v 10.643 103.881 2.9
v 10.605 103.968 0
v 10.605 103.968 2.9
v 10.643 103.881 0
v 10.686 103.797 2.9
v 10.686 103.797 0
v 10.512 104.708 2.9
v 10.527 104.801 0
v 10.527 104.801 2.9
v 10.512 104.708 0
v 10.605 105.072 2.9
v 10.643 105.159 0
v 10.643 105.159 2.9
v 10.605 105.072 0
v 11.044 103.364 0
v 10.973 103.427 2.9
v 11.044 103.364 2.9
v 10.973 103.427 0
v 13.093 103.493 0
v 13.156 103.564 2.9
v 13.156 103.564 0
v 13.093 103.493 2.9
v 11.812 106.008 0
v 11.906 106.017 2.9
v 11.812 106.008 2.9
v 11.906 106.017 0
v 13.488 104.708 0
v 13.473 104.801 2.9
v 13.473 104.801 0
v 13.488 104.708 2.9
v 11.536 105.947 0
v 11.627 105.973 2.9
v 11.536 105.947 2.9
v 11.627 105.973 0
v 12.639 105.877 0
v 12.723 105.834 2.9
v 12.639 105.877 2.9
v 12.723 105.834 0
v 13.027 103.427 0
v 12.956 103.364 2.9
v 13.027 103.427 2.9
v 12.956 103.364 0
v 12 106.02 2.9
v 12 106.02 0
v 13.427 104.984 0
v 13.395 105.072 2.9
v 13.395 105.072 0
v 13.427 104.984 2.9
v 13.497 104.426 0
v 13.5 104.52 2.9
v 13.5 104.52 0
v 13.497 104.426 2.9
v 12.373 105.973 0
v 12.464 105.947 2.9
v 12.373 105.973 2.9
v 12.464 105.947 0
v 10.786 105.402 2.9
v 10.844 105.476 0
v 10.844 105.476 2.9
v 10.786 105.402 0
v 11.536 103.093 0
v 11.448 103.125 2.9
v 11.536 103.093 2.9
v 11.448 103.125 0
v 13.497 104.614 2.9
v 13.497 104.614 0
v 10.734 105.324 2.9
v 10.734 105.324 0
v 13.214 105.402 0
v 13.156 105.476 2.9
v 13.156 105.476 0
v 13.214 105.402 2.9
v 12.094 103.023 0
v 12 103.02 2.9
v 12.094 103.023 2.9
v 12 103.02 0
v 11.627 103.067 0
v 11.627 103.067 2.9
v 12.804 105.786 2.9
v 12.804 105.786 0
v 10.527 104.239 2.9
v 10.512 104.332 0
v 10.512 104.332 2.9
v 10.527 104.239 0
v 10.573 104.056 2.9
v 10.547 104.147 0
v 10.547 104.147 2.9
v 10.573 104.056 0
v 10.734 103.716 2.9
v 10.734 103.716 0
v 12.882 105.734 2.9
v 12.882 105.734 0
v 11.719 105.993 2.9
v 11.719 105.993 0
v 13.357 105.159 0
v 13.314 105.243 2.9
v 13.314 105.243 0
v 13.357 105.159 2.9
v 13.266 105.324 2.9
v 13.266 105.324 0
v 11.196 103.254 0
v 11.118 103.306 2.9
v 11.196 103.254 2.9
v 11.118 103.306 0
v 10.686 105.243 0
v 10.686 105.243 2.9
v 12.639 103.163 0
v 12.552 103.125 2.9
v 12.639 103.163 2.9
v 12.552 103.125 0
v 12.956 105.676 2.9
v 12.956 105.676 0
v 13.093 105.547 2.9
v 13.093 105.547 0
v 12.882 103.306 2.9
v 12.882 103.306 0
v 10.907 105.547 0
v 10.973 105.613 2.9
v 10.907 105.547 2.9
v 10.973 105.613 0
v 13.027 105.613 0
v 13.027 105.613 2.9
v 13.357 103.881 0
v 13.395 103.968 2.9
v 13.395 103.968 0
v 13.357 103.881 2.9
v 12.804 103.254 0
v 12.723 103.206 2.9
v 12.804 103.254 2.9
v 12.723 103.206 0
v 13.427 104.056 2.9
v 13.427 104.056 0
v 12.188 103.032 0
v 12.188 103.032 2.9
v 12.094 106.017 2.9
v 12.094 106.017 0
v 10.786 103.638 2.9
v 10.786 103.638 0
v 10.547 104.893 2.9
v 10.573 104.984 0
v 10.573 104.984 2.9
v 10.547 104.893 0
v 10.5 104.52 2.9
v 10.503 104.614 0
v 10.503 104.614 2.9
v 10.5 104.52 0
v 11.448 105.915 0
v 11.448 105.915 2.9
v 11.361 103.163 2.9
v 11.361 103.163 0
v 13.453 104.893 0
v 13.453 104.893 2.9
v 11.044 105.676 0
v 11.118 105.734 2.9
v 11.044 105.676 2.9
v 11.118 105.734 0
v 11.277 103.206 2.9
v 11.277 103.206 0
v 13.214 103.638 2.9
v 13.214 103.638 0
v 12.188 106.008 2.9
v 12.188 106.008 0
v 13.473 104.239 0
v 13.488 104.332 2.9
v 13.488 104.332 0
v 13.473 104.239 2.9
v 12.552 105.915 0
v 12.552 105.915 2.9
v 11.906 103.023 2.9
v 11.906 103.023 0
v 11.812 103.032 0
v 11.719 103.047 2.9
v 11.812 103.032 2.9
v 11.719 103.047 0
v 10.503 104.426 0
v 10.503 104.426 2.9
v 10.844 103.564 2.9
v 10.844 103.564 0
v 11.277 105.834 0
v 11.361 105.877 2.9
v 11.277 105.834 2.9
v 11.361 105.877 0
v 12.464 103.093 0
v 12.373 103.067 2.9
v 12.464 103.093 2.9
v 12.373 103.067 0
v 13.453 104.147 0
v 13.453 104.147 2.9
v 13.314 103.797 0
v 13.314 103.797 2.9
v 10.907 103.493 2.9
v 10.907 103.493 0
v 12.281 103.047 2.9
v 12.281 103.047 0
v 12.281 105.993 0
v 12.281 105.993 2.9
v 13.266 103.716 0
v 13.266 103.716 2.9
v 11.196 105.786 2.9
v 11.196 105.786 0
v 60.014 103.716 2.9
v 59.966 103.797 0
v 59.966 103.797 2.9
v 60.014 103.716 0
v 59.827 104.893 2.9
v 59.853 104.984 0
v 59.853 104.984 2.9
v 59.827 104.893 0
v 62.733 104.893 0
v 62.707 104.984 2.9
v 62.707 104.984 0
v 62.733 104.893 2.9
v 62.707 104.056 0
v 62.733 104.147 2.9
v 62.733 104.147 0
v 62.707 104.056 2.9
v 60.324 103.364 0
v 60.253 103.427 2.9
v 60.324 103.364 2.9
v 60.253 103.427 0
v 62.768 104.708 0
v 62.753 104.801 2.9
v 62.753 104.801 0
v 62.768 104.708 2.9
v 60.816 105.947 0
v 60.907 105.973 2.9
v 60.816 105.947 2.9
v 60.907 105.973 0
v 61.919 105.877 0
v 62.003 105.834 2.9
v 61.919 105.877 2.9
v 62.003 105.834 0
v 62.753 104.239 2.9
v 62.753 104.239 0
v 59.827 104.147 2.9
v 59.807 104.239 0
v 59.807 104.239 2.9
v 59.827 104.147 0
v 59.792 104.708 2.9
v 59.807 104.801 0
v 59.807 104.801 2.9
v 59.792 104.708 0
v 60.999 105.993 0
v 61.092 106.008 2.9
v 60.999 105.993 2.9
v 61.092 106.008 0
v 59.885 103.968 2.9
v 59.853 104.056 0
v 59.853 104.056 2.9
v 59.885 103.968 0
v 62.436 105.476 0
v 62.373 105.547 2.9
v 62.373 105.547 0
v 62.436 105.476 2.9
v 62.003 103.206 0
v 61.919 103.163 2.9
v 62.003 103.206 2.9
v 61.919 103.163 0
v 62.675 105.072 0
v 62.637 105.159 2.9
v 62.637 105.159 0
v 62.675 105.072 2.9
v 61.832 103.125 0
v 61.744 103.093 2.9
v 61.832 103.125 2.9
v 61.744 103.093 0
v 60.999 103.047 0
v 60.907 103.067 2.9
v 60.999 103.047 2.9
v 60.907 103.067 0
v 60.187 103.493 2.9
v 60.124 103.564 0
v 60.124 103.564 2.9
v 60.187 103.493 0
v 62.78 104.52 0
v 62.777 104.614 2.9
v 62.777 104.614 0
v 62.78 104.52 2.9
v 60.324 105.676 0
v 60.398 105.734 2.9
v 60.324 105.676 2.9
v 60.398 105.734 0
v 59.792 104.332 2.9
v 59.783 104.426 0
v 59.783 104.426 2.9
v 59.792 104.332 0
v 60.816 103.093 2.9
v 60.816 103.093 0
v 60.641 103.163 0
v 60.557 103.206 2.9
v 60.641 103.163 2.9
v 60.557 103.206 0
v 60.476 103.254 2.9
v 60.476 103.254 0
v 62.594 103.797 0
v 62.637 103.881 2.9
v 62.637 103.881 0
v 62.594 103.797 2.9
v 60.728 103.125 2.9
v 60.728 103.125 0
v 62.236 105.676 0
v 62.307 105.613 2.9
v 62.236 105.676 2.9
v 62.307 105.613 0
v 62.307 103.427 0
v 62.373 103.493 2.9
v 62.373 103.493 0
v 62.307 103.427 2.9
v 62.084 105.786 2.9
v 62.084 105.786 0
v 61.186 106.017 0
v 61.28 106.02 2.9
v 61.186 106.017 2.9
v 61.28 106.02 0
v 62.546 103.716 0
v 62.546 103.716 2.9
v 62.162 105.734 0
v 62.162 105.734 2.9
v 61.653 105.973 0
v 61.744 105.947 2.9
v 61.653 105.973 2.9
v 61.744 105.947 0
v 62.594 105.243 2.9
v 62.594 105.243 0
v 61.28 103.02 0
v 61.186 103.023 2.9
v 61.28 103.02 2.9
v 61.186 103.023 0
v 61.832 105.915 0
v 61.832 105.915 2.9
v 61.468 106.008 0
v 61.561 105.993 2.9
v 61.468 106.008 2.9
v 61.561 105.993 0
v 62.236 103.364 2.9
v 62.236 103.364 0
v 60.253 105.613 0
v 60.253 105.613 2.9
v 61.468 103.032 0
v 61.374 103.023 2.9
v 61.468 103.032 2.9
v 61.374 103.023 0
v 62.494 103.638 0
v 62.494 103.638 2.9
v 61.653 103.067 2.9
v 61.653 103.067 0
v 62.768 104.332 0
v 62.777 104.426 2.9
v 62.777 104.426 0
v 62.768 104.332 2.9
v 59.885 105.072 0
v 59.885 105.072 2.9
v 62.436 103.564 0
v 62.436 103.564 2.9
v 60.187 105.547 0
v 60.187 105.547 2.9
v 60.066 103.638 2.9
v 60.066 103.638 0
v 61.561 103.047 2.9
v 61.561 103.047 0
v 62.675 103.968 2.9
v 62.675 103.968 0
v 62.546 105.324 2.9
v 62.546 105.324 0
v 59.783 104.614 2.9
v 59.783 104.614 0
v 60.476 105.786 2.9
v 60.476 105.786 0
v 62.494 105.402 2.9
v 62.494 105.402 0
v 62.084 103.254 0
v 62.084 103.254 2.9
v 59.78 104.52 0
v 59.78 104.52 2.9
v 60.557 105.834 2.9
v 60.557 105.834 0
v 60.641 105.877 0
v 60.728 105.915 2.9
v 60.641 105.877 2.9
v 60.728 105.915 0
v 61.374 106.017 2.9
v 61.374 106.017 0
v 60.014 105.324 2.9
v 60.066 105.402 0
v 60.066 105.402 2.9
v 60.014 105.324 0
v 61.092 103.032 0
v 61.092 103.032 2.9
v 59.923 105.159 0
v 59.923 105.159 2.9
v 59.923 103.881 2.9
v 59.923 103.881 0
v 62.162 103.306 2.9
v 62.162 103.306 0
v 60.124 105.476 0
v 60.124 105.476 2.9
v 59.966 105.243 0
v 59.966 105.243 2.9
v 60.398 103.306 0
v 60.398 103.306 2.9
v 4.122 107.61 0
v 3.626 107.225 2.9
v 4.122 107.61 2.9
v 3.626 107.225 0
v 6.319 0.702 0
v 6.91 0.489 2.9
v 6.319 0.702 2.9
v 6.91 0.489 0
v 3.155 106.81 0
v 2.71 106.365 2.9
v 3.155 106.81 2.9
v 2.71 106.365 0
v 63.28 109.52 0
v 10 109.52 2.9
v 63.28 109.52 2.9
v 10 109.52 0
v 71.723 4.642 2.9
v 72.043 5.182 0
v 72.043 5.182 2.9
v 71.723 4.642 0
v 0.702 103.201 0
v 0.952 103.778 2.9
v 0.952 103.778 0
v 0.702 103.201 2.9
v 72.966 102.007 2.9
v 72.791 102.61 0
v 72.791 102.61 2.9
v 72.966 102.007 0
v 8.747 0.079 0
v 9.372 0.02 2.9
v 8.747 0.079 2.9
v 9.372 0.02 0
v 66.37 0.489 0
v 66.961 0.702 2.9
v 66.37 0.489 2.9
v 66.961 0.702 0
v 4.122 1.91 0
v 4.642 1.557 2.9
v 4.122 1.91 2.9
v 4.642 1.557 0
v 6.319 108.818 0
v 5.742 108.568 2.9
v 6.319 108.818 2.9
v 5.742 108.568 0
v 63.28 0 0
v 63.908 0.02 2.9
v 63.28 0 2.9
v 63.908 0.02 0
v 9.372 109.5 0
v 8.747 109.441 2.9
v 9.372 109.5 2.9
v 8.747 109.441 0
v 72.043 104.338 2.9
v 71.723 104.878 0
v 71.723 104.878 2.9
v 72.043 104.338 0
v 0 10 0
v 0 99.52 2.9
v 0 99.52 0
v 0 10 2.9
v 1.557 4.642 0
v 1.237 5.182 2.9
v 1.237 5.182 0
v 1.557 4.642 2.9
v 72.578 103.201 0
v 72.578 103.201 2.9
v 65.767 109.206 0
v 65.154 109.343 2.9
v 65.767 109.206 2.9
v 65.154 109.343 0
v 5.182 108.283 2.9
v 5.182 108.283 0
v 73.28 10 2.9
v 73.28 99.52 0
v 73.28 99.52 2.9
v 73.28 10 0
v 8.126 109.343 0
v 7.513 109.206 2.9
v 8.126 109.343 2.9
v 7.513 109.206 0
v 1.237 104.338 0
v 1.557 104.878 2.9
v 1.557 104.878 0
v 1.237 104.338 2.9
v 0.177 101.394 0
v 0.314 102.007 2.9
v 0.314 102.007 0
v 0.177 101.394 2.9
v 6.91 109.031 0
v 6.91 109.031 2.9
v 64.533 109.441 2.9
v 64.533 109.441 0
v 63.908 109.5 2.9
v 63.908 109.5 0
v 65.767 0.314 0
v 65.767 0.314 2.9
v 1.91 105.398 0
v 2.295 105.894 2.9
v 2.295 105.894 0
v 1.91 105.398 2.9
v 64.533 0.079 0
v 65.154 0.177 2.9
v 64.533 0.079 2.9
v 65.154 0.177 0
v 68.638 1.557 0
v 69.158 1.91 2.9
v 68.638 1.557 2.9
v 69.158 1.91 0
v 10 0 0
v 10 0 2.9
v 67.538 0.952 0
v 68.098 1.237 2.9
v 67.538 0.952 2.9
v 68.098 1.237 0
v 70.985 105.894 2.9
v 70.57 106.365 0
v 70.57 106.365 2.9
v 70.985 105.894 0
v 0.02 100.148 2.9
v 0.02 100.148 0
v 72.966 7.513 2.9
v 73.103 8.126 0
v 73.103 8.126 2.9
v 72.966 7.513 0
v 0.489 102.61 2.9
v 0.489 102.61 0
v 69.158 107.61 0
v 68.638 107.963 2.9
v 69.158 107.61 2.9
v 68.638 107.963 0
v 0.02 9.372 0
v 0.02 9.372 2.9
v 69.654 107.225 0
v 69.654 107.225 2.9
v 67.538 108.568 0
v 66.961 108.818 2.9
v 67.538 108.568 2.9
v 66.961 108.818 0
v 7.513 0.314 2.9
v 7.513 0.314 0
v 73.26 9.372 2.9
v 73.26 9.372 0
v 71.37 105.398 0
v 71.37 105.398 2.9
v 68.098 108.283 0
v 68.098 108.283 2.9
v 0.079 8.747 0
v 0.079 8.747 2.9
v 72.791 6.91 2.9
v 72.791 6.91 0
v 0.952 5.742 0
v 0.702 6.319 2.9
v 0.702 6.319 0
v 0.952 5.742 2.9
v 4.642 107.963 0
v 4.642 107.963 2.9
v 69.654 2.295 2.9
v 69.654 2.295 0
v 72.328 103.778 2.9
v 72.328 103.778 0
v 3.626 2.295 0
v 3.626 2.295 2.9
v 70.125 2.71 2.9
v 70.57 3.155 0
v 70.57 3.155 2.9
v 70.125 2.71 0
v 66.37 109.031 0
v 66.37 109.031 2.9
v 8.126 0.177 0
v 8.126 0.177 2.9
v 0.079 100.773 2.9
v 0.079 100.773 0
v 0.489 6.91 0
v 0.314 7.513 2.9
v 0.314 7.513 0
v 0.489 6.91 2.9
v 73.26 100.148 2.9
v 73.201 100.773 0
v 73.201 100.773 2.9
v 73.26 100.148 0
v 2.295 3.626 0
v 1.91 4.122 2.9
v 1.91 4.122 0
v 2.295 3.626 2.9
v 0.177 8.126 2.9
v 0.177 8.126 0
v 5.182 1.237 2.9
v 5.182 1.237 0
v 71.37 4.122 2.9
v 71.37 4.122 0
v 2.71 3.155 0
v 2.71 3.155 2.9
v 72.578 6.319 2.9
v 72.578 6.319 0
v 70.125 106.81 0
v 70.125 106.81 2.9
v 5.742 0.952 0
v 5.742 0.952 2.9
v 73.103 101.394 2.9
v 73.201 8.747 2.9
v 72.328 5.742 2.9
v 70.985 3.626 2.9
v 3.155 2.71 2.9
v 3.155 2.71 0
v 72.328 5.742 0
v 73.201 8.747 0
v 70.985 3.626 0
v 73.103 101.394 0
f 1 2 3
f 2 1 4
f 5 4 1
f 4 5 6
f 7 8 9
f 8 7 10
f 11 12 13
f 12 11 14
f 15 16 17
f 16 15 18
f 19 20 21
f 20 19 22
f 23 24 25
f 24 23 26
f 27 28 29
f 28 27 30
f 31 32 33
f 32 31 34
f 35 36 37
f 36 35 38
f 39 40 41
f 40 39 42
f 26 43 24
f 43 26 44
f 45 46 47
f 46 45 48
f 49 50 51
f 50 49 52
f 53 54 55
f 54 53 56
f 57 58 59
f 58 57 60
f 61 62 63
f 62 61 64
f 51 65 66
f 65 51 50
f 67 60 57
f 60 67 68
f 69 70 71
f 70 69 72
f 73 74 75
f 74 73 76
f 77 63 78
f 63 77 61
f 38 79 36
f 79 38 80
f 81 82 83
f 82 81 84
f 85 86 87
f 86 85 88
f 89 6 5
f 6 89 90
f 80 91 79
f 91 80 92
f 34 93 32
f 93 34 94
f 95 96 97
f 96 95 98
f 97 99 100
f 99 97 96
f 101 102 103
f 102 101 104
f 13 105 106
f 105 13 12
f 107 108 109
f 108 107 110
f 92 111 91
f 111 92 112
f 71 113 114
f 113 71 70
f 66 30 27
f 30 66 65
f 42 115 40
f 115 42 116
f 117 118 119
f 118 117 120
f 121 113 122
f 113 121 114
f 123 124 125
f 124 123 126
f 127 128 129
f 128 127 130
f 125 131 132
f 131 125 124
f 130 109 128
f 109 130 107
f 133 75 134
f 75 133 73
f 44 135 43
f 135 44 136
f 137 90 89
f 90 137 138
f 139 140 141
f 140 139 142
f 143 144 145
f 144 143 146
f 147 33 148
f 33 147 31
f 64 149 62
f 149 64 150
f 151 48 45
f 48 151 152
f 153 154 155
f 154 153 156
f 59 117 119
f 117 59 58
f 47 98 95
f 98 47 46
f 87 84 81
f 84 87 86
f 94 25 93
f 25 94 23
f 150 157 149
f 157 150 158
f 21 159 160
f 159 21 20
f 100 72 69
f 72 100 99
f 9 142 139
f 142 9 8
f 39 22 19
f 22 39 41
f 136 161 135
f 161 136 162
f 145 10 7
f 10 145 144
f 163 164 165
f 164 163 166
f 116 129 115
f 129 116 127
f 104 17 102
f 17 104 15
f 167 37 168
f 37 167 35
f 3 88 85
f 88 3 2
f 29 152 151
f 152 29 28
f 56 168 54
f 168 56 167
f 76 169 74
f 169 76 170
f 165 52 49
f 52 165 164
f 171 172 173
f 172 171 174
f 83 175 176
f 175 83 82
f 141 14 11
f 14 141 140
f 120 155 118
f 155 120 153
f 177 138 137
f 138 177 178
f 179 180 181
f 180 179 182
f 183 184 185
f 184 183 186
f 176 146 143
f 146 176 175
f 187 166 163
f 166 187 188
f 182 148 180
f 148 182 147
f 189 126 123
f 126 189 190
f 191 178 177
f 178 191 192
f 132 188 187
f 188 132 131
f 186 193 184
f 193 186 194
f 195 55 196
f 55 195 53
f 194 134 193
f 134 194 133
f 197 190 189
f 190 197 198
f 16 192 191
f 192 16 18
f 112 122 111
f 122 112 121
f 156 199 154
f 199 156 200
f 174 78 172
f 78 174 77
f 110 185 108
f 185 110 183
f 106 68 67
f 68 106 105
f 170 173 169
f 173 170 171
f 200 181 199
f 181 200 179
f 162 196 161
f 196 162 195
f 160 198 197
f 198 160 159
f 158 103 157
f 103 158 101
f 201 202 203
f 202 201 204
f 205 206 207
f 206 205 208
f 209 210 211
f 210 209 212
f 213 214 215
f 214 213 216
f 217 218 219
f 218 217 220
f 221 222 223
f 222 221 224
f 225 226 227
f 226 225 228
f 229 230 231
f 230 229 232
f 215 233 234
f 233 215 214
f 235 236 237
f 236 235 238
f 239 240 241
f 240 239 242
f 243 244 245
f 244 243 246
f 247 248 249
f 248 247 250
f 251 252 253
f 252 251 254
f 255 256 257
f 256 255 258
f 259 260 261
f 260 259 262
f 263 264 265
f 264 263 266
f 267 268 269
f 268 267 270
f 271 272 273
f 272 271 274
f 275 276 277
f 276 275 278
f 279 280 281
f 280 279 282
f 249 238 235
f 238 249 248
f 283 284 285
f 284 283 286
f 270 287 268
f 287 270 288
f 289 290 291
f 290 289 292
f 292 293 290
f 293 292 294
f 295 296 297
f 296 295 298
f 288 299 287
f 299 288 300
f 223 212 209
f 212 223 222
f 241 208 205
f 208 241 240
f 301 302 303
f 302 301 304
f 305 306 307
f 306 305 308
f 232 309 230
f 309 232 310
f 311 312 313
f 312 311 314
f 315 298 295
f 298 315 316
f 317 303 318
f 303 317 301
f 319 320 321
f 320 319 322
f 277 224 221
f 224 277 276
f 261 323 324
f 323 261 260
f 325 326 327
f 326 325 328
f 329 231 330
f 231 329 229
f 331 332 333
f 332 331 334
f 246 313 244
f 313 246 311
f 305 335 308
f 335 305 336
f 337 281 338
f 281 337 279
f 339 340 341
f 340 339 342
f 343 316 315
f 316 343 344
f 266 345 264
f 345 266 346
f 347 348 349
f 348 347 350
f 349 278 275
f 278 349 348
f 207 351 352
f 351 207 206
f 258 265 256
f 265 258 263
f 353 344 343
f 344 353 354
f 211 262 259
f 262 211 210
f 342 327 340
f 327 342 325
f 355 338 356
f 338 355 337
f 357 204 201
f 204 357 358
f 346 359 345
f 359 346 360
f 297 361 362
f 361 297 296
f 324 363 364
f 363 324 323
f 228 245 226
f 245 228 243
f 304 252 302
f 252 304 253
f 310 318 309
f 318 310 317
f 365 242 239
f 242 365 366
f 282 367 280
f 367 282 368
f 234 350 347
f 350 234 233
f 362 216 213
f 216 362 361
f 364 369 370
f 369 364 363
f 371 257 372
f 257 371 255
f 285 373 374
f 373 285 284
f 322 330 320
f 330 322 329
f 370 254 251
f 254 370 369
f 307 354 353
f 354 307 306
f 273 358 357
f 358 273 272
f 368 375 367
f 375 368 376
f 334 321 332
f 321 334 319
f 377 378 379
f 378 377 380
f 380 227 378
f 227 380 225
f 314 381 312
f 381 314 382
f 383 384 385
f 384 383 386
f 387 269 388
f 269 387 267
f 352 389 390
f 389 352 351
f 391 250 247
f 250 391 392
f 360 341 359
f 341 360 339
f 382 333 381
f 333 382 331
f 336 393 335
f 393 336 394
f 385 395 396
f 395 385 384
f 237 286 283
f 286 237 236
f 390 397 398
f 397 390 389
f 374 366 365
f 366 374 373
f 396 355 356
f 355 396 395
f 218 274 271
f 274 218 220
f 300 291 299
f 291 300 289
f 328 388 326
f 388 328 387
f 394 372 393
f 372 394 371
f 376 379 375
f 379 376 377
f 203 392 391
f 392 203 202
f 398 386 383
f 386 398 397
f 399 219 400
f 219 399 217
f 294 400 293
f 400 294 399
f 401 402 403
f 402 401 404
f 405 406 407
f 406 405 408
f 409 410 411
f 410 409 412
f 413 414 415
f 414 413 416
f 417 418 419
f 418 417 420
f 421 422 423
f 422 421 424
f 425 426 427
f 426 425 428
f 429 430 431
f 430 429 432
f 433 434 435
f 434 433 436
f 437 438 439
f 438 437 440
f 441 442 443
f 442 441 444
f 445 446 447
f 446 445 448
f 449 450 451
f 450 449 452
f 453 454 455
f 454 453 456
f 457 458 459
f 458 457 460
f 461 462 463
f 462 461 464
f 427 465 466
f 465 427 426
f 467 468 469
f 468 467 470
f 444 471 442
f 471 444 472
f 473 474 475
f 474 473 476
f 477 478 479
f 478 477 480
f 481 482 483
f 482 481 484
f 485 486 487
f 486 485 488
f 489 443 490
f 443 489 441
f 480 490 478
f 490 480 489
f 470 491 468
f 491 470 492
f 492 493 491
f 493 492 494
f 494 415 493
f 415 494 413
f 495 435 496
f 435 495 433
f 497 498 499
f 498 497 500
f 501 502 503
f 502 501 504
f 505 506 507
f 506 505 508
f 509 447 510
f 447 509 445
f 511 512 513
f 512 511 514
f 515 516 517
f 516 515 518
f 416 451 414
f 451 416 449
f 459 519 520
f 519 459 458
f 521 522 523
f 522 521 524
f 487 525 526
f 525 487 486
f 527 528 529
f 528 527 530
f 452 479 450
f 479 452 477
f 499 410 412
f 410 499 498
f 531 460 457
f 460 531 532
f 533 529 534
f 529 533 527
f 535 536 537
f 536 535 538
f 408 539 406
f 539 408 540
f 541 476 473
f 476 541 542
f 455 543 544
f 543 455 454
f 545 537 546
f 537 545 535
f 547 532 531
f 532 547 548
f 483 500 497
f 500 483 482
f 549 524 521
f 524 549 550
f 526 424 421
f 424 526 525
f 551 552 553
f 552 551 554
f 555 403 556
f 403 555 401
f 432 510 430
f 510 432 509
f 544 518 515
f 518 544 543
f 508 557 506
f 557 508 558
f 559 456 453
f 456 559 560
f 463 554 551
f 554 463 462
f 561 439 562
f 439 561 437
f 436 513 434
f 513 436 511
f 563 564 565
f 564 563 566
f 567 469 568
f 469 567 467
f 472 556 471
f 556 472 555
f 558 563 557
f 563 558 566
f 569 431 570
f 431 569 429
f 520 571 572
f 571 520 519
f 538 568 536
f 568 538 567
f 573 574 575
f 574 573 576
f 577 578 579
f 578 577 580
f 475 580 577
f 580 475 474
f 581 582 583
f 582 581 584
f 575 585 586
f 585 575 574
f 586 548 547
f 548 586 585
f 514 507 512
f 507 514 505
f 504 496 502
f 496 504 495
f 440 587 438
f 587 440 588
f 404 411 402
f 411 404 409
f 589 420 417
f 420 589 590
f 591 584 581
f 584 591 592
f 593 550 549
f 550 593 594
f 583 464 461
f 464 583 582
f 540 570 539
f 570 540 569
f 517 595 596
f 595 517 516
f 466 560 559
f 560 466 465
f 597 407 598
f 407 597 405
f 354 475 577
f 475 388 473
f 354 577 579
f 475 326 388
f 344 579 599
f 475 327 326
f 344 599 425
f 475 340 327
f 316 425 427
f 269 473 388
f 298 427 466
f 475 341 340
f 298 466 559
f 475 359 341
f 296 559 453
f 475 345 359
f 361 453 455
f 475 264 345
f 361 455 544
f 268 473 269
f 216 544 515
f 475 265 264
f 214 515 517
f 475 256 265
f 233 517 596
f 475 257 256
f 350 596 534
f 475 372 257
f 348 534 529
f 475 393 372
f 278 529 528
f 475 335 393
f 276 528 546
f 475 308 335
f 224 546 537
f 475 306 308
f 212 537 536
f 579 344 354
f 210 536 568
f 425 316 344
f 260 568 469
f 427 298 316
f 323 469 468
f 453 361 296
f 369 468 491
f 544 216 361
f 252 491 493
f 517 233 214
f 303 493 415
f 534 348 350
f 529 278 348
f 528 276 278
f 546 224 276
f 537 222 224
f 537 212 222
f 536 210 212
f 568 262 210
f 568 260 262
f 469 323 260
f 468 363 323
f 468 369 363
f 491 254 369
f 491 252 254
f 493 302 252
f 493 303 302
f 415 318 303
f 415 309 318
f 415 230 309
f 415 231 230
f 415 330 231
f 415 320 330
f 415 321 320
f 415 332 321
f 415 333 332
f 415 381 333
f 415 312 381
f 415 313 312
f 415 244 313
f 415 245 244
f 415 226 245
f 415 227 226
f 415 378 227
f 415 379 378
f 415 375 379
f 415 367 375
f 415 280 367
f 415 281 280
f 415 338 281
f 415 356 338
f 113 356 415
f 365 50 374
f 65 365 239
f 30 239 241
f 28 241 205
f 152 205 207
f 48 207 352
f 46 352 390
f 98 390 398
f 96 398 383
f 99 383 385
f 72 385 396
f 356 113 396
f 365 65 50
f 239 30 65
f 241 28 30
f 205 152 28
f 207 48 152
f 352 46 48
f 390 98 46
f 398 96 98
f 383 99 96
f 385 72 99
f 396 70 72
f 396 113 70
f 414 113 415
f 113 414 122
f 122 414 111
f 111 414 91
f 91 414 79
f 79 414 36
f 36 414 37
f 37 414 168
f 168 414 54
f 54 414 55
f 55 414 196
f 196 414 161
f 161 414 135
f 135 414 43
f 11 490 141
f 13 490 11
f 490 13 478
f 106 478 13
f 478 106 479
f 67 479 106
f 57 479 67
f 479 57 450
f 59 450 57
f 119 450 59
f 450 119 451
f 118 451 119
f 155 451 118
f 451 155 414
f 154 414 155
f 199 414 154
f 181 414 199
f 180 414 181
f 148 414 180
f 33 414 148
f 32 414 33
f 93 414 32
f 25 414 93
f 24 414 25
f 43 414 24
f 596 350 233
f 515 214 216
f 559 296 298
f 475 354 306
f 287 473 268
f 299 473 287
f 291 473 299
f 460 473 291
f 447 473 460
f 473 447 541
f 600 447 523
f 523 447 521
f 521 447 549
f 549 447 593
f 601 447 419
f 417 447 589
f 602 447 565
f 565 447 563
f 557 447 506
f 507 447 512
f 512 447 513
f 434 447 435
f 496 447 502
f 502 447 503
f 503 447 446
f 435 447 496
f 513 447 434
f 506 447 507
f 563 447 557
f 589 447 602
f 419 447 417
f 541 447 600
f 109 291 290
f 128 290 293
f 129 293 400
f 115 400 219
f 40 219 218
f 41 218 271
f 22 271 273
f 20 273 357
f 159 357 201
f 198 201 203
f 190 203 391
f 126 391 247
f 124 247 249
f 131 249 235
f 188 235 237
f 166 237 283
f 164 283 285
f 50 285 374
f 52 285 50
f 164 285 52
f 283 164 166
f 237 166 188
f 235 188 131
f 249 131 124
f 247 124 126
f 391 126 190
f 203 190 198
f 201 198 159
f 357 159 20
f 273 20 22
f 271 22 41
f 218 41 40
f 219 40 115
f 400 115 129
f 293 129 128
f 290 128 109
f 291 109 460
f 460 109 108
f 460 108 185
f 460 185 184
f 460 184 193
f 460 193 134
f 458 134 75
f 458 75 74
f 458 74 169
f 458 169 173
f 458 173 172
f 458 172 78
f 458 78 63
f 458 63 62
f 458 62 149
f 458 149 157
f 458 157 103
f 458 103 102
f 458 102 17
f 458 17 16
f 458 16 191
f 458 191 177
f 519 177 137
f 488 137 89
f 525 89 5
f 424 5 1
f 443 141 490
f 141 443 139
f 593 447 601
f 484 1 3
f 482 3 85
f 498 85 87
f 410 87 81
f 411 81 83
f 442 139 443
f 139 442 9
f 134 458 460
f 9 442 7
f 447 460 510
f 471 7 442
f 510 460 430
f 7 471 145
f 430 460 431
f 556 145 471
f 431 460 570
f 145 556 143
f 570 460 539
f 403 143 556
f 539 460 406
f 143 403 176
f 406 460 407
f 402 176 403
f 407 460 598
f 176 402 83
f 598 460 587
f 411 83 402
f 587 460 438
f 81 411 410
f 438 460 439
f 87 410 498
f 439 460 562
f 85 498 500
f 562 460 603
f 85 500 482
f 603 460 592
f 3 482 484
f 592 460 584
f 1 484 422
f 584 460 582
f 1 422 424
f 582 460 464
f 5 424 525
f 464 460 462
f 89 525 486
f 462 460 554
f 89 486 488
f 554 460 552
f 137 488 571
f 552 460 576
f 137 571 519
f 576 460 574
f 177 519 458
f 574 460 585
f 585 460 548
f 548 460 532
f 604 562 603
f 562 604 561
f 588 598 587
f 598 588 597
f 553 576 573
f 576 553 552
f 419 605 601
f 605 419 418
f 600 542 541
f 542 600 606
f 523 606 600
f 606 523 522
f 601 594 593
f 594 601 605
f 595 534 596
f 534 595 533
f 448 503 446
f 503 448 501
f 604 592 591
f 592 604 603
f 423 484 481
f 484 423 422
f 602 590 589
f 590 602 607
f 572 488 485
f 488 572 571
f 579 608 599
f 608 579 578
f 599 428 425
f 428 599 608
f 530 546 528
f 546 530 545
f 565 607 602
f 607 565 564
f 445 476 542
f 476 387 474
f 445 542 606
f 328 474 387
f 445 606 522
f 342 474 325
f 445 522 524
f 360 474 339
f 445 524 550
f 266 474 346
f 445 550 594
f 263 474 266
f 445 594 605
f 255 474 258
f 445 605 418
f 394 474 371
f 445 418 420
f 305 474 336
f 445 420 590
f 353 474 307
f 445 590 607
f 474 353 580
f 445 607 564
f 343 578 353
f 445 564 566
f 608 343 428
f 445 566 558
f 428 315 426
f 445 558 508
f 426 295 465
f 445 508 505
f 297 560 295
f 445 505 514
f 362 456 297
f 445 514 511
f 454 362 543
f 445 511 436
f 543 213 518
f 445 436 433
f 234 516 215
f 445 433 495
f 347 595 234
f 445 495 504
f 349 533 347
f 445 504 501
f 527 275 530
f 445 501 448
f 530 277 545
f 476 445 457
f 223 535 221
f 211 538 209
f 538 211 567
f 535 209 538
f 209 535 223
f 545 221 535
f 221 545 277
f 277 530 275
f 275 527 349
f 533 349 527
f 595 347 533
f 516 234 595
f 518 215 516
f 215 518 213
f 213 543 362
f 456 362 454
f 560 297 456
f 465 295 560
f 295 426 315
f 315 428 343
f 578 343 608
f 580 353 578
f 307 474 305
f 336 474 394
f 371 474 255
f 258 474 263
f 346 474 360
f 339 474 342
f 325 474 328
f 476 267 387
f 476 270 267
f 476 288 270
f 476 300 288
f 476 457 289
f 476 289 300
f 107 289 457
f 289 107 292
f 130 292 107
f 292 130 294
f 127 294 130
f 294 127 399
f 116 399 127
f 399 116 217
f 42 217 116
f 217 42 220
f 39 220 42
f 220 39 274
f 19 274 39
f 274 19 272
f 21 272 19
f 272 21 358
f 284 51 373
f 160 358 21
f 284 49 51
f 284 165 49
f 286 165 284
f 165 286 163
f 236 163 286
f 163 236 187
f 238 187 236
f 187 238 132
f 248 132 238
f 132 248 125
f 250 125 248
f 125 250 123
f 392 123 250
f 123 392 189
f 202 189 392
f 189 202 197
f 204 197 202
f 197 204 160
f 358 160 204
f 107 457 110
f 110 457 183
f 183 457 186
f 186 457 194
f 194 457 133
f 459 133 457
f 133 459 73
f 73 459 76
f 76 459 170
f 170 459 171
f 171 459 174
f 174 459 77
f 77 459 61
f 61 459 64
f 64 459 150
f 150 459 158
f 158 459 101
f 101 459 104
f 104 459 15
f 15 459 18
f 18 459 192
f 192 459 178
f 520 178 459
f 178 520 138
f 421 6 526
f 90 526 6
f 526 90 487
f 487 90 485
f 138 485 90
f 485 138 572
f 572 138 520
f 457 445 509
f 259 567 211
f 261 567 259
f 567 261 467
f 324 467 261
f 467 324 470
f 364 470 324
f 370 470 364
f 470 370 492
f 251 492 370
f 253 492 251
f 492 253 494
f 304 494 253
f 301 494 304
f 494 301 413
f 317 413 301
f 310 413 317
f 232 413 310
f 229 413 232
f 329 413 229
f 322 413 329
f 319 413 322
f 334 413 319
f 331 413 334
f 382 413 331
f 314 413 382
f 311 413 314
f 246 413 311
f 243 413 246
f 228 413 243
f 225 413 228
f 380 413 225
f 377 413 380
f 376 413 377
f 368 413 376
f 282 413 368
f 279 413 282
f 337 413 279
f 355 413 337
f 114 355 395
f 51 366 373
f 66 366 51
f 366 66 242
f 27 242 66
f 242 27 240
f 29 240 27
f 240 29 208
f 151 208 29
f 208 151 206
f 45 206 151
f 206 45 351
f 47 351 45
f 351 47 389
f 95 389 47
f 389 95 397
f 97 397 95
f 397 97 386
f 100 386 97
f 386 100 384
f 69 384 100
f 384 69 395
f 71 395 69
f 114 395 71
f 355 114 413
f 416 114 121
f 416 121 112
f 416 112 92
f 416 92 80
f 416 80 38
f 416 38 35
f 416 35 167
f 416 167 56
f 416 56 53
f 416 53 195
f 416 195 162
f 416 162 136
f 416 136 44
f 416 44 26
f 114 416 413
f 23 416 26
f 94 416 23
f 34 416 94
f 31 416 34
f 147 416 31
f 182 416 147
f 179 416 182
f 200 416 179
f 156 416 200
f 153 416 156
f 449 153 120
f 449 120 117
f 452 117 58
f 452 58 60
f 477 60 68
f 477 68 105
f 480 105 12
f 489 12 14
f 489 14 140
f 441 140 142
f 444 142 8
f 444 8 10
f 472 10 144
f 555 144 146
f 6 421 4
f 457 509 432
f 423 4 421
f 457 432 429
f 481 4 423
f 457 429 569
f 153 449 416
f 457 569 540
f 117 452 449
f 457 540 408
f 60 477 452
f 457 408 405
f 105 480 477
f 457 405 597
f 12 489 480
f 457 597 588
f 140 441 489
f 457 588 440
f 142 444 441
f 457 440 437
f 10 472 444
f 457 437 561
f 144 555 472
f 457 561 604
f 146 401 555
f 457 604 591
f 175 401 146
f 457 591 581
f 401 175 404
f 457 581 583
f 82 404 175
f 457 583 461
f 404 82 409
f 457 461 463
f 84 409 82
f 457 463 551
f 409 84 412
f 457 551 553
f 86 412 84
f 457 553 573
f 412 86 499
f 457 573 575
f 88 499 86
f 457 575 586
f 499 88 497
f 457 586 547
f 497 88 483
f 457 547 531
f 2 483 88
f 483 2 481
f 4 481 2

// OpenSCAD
// --- PARAMETRAR FÖR FAIRPHONE 6 ---
// Baserat på officiella dimensioner (Gen 6)
$fn = 100;

// Panelens dimensioner
width = 73.28;        // Bredd
height = 109.52;      // Höjd på den utbytbara nedre delen
thickness = 2.9;      // Standardtjocklek
corner_radius = 10;   // Uppskattad hörnradie

// Skruvhål (Placering för de två fästskruvarna)
screw_hole_d = 3.0;   // Diameter för skruven
screw_offset_x = 12;  // Avstånd från sidokanten
screw_offset_y = 5;   // Avstånd från panelens överkant

// --- MODULER ---

module fp6_backplate_base() {
    // Skapar den rundade basplattan med hull()
    hull() {
        translate([corner_radius, corner_radius, 0]) 
            cylinder(r=corner_radius, h=thickness);
        translate([width-corner_radius, corner_radius, 0]) 
            cylinder(r=corner_radius, h=thickness);
        translate([corner_radius, height-corner_radius, 0]) 
            cylinder(r=corner_radius, h=thickness);
        translate([width-corner_radius, height-corner_radius, 0]) 
            cylinder(r=corner_radius, h=thickness);
    }
}

module screw_cutouts() {
    // Vänster skruvhål
    translate([screw_offset_x, height - screw_offset_y, -1])
        cylinder(d=screw_hole_d, h=thickness + 2);
    
    // Höger skruvhål
    translate([width - screw_offset_x, height - screw_offset_y, -1])
        cylinder(d=screw_hole_d, h=thickness + 2);
}

// --- RENDERING ---
difference() {
    fp6_backplate_base();
    screw_cutouts();
    
    // Tips: Här kan du lägga till egna urgröpningar eller mönster
    // logo_cutout(); 
}

// Exempel på att lägga till en hållare för t.ex. ett kort
/*
translate([width/2 - 27, 20, thickness])
    cube([54, 85, 2]); // Standard kreditkortsstorlek
*/
